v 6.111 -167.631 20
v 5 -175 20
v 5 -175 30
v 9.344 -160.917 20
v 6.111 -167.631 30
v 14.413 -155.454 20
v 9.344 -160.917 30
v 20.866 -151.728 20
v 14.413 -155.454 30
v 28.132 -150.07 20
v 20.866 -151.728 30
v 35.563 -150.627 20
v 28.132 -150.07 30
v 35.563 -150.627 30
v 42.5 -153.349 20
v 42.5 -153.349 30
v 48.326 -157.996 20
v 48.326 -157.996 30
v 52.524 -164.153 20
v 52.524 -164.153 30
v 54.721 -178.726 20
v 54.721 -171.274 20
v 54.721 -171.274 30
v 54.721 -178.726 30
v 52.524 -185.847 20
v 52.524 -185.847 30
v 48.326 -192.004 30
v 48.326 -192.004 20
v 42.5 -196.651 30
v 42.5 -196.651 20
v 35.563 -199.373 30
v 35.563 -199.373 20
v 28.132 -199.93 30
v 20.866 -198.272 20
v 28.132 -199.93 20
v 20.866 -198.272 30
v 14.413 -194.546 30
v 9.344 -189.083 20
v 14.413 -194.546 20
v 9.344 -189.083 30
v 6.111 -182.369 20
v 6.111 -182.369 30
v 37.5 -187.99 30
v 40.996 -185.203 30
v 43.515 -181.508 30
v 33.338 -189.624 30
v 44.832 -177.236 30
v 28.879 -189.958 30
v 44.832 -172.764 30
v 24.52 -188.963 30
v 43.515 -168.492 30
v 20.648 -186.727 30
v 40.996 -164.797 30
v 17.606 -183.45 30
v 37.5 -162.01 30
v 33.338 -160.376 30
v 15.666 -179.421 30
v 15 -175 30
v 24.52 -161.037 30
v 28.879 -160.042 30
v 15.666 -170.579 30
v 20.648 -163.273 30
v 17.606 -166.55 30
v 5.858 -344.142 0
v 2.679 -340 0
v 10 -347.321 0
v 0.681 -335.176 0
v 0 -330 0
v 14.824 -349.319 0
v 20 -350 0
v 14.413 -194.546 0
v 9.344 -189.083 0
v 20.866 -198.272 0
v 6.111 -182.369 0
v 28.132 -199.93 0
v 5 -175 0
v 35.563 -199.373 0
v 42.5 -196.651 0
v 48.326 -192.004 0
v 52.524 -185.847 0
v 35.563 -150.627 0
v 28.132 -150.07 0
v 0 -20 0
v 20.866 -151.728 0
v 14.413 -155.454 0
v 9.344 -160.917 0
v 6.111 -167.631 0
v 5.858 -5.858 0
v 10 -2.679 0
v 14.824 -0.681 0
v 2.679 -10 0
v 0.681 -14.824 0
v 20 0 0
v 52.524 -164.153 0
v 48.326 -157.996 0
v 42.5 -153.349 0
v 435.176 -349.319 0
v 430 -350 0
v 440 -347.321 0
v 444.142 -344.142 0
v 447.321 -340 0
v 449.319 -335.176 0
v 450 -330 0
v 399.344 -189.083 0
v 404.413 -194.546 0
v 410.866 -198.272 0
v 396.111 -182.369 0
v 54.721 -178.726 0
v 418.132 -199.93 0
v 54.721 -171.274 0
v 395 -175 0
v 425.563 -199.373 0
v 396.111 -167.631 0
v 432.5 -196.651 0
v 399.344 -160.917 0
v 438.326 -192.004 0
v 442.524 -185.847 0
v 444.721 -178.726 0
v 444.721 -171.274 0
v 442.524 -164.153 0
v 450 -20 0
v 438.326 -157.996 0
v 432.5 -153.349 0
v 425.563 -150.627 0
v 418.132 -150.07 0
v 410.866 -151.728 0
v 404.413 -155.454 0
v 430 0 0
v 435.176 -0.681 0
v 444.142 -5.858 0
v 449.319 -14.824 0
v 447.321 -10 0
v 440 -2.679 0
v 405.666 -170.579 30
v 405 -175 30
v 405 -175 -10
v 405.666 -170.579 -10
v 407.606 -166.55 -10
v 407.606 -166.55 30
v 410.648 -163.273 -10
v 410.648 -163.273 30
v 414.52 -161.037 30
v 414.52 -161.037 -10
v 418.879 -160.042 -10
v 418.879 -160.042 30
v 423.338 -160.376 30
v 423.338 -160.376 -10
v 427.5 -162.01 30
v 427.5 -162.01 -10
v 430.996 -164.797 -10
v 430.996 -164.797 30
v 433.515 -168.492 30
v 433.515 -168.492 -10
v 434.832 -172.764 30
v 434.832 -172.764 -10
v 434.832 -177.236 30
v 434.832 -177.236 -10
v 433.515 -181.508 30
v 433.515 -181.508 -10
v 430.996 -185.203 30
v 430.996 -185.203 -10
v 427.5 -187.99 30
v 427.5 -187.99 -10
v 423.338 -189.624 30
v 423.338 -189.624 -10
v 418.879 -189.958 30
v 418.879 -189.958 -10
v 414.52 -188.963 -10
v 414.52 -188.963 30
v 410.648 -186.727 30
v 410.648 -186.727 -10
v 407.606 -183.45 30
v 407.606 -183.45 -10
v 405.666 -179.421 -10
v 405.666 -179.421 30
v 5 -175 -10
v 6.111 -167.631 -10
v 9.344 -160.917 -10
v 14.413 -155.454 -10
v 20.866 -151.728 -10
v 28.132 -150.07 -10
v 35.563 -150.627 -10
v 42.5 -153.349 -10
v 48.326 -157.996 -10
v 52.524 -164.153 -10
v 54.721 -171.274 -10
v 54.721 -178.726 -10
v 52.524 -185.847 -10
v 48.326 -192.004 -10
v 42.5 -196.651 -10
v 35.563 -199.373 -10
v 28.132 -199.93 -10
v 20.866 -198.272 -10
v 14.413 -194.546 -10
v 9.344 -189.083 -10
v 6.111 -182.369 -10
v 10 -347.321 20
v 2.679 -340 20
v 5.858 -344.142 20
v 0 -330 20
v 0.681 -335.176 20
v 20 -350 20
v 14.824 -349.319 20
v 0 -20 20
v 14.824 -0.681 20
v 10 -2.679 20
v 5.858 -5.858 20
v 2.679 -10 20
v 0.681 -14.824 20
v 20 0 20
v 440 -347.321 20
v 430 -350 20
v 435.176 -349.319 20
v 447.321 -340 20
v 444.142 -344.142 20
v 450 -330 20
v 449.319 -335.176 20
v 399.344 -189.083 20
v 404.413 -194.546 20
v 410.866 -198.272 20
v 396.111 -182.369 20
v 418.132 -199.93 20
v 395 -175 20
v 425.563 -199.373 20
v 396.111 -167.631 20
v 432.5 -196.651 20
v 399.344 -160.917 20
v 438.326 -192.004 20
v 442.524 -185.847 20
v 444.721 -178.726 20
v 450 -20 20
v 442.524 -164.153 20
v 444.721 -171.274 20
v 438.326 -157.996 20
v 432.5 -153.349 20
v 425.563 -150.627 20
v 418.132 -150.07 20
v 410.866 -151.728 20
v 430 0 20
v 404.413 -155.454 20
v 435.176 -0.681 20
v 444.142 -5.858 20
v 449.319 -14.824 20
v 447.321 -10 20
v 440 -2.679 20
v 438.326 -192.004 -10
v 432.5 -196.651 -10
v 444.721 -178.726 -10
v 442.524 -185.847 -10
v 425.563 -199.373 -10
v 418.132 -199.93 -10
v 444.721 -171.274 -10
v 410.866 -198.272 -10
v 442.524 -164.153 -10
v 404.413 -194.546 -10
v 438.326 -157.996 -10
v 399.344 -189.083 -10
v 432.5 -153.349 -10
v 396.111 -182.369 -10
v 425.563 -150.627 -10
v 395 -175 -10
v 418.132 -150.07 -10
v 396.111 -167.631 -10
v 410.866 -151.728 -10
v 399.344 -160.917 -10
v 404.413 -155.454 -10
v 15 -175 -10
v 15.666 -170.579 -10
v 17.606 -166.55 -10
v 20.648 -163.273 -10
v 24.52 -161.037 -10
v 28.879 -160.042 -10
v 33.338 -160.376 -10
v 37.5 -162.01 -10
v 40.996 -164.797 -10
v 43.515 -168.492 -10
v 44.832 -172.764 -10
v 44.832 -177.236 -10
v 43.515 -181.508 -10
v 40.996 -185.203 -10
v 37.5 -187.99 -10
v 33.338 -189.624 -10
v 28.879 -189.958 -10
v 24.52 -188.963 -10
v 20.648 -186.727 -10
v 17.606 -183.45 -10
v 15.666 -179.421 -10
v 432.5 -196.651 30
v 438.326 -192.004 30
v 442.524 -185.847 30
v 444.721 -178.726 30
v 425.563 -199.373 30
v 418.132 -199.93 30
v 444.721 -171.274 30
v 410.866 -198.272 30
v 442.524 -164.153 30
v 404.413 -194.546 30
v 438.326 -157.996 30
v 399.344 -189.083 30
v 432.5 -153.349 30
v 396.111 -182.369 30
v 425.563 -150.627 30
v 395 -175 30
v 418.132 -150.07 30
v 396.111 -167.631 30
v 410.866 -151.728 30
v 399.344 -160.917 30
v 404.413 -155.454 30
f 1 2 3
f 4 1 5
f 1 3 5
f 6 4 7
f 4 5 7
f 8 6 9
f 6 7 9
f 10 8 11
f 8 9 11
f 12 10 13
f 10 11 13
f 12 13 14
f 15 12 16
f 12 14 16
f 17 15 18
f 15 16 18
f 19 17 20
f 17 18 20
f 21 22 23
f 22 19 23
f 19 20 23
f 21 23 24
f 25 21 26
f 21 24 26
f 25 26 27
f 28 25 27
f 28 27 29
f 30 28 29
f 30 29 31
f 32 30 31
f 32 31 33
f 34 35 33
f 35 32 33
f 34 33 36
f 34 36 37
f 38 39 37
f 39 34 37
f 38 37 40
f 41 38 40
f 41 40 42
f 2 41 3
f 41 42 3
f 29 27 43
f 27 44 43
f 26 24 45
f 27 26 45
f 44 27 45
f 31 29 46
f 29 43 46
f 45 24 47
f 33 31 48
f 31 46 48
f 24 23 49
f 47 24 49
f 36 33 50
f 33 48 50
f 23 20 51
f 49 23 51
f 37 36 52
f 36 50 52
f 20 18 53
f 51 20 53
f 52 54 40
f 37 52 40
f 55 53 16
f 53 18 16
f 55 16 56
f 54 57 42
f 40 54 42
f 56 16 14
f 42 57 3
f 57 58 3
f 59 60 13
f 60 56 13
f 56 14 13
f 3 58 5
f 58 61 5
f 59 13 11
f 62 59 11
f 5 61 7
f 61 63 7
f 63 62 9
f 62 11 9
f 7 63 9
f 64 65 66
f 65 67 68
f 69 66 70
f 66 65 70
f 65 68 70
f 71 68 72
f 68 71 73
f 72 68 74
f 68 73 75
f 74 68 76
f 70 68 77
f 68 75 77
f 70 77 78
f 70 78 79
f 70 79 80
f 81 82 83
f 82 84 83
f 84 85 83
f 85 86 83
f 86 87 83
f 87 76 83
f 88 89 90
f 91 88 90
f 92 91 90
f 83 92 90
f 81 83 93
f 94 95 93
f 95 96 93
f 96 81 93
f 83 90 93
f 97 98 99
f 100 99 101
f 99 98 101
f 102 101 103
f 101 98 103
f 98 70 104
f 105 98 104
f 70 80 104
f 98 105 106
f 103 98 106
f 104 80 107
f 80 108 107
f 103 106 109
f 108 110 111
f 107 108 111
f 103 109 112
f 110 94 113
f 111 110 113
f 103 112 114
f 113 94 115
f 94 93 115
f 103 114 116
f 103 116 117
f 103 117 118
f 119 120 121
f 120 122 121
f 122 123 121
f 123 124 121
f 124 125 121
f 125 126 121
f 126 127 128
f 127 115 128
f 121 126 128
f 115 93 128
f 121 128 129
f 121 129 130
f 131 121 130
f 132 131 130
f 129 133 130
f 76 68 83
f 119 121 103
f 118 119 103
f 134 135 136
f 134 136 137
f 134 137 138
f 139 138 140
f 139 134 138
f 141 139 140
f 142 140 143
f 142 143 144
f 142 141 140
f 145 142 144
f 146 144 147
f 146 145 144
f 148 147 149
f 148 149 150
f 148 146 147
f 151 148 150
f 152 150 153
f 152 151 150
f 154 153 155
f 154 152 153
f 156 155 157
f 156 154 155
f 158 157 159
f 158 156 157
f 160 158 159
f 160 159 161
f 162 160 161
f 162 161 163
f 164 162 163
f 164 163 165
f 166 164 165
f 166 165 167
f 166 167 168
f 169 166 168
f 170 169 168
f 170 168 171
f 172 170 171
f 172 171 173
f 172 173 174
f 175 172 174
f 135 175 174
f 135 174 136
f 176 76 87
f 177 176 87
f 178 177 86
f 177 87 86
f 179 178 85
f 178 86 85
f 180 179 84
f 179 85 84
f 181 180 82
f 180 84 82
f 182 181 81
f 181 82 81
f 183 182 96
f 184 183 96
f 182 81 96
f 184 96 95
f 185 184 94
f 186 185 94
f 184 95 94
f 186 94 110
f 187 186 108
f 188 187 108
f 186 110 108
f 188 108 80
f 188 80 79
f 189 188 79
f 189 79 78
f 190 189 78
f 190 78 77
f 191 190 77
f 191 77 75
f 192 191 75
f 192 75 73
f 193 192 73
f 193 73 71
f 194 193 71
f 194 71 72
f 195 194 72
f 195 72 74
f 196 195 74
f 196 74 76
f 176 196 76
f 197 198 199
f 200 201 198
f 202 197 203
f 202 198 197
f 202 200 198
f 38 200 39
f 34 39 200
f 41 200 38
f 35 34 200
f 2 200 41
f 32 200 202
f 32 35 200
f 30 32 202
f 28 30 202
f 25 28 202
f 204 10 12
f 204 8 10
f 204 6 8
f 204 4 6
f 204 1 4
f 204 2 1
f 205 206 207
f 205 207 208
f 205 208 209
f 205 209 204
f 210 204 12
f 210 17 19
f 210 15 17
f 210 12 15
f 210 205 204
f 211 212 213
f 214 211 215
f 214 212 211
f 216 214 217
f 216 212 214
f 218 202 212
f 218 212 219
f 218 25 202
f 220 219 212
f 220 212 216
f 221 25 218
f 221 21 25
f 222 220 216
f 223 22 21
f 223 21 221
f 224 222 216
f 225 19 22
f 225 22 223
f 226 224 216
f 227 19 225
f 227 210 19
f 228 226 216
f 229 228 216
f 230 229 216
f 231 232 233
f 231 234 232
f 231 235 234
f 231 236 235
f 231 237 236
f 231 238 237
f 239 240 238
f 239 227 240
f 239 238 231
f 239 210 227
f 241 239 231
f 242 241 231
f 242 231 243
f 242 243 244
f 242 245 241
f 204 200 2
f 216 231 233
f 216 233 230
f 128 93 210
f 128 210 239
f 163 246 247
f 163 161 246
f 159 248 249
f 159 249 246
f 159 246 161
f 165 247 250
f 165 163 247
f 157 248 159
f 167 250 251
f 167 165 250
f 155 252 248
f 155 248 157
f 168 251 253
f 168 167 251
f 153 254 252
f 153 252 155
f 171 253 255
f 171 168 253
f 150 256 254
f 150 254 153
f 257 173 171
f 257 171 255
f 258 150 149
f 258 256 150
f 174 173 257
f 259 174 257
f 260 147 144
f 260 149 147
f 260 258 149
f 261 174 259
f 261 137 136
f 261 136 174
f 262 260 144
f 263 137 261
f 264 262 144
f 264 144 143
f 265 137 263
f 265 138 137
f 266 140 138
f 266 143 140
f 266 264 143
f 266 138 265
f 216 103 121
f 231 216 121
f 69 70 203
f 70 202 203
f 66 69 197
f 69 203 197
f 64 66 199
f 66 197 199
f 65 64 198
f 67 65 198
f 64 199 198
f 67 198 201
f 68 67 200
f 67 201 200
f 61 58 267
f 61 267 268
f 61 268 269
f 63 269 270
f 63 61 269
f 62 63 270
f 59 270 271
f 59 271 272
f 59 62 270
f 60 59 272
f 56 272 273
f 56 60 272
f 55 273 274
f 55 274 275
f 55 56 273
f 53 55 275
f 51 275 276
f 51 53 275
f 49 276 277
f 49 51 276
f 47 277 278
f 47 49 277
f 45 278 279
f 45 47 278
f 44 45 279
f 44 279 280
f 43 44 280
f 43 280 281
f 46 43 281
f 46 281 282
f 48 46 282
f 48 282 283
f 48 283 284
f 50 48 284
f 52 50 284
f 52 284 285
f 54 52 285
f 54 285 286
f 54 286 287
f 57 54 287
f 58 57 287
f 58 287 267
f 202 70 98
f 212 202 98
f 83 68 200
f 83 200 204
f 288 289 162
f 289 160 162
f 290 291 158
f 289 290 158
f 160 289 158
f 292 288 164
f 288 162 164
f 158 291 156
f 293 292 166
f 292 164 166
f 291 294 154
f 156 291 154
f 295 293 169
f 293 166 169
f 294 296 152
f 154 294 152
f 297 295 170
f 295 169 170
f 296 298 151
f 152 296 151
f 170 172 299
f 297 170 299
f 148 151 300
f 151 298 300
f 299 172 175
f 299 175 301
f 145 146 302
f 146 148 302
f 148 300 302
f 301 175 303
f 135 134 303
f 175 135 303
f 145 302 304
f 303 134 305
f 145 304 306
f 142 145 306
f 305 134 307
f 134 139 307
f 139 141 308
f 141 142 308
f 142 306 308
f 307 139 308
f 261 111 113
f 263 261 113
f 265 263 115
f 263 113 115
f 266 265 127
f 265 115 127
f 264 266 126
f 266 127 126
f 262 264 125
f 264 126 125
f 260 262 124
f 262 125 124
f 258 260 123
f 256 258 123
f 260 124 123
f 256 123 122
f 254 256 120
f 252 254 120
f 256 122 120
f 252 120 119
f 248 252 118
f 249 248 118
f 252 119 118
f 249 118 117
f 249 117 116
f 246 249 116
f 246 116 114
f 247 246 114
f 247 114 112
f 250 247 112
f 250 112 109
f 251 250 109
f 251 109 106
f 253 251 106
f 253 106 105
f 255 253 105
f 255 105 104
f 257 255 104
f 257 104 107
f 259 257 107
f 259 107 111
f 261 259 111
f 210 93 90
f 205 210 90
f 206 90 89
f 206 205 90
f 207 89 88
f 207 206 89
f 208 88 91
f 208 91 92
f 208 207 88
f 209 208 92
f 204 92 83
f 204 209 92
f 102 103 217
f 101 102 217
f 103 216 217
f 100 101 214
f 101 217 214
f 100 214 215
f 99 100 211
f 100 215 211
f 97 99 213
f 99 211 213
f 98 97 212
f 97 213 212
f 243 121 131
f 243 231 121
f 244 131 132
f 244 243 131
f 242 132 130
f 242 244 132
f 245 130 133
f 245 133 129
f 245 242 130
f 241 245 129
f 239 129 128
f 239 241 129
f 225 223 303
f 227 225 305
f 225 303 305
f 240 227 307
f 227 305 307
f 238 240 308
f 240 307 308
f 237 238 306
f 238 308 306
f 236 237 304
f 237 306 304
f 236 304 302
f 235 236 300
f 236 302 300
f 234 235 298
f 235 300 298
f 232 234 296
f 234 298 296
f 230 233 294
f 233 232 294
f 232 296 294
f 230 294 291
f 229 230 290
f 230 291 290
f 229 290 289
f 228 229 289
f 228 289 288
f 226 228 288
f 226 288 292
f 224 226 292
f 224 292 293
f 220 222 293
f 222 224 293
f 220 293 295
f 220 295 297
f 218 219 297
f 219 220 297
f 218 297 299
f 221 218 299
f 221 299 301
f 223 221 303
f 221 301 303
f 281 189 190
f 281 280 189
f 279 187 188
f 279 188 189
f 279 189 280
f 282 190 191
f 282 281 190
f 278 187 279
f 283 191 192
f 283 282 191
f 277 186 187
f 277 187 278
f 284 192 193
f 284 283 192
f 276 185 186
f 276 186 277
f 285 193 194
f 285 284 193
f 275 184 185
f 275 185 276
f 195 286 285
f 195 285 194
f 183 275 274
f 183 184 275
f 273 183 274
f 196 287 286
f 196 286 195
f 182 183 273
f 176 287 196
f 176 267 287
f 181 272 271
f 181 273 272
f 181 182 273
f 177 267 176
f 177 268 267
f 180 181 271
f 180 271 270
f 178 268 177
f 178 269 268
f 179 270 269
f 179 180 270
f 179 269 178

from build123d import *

# Parameters (mm, degrees)
SKETCH1_W                = 450
SKETCH1_H                = 350
BOSS_EXTRUDE1_DEPTH      = 20
SKETCH2_R                = 15
CUT_EXTRUDE1_DEPTH       = 25
BOSS_EXTRUDE2_DEPTH      = 10
BOSS_EXTRUDE2_DEPTH_BACK = 30
SKETCH3_R                = 25
SKETCH3_R_2              = 15
FILLET1_R                = 20


with BuildPart() as part:
    # Sketch1 → Boss-Extrude1 (new body)
    with BuildSketch(Plane.XY):
        with Locations((225, -175)):
            Rectangle(SKETCH1_W, SKETCH1_H)
    extrude(amount=BOSS_EXTRUDE1_DEPTH)

    # Sketch2 → Cut-Extrude1 (cut)
    with BuildSketch(Plane(origin=(0, 0, 0), x_dir=(-1, 0, 0), z_dir=(0, 0, -1))):
        with Locations((-420, -175)):
            Circle(SKETCH2_R)
        with Locations((-30, -175)):
            Circle(SKETCH2_R)
    extrude(amount=-CUT_EXTRUDE1_DEPTH, mode=Mode.SUBTRACT)

    # Sketch3 → Boss-Extrude2 (add, two sides: drawn at the far end of the back side and taken through both)
    # profile 1 of 2: a face of its own
    with BuildSketch(Plane(origin=(0, 0, 0), x_dir=(-1, 0, 0), z_dir=(0, 0, -1)).offset(-BOSS_EXTRUDE2_DEPTH_BACK)):
        with Locations((-420, -175)):
            Circle(SKETCH3_R)
        with Locations((-420, -175)):
            Circle(SKETCH3_R_2, mode=Mode.SUBTRACT)
    # profile 2 of 2: a face of its own
    with BuildSketch(Plane(origin=(0, 0, 0), x_dir=(-1, 0, 0), z_dir=(0, 0, -1)).offset(-BOSS_EXTRUDE2_DEPTH_BACK)):
        with Locations((-30, -175)):
            Circle(SKETCH3_R)
        with Locations((-30, -175)):
            Circle(SKETCH3_R_2, mode=Mode.SUBTRACT)
    extrude(amount=BOSS_EXTRUDE2_DEPTH + BOSS_EXTRUDE2_DEPTH_BACK)

    # Fillet1
    fillet1_edges = [part.edges().sort_by_distance(p)[0] for p in [
        (0, 0, 10),
        (450, 0, 10),
        (450, -350, 10),
        (0, -350, 10),
    ]]
    fillet(fillet1_edges, radius=FILLET1_R)


solid = part.part
